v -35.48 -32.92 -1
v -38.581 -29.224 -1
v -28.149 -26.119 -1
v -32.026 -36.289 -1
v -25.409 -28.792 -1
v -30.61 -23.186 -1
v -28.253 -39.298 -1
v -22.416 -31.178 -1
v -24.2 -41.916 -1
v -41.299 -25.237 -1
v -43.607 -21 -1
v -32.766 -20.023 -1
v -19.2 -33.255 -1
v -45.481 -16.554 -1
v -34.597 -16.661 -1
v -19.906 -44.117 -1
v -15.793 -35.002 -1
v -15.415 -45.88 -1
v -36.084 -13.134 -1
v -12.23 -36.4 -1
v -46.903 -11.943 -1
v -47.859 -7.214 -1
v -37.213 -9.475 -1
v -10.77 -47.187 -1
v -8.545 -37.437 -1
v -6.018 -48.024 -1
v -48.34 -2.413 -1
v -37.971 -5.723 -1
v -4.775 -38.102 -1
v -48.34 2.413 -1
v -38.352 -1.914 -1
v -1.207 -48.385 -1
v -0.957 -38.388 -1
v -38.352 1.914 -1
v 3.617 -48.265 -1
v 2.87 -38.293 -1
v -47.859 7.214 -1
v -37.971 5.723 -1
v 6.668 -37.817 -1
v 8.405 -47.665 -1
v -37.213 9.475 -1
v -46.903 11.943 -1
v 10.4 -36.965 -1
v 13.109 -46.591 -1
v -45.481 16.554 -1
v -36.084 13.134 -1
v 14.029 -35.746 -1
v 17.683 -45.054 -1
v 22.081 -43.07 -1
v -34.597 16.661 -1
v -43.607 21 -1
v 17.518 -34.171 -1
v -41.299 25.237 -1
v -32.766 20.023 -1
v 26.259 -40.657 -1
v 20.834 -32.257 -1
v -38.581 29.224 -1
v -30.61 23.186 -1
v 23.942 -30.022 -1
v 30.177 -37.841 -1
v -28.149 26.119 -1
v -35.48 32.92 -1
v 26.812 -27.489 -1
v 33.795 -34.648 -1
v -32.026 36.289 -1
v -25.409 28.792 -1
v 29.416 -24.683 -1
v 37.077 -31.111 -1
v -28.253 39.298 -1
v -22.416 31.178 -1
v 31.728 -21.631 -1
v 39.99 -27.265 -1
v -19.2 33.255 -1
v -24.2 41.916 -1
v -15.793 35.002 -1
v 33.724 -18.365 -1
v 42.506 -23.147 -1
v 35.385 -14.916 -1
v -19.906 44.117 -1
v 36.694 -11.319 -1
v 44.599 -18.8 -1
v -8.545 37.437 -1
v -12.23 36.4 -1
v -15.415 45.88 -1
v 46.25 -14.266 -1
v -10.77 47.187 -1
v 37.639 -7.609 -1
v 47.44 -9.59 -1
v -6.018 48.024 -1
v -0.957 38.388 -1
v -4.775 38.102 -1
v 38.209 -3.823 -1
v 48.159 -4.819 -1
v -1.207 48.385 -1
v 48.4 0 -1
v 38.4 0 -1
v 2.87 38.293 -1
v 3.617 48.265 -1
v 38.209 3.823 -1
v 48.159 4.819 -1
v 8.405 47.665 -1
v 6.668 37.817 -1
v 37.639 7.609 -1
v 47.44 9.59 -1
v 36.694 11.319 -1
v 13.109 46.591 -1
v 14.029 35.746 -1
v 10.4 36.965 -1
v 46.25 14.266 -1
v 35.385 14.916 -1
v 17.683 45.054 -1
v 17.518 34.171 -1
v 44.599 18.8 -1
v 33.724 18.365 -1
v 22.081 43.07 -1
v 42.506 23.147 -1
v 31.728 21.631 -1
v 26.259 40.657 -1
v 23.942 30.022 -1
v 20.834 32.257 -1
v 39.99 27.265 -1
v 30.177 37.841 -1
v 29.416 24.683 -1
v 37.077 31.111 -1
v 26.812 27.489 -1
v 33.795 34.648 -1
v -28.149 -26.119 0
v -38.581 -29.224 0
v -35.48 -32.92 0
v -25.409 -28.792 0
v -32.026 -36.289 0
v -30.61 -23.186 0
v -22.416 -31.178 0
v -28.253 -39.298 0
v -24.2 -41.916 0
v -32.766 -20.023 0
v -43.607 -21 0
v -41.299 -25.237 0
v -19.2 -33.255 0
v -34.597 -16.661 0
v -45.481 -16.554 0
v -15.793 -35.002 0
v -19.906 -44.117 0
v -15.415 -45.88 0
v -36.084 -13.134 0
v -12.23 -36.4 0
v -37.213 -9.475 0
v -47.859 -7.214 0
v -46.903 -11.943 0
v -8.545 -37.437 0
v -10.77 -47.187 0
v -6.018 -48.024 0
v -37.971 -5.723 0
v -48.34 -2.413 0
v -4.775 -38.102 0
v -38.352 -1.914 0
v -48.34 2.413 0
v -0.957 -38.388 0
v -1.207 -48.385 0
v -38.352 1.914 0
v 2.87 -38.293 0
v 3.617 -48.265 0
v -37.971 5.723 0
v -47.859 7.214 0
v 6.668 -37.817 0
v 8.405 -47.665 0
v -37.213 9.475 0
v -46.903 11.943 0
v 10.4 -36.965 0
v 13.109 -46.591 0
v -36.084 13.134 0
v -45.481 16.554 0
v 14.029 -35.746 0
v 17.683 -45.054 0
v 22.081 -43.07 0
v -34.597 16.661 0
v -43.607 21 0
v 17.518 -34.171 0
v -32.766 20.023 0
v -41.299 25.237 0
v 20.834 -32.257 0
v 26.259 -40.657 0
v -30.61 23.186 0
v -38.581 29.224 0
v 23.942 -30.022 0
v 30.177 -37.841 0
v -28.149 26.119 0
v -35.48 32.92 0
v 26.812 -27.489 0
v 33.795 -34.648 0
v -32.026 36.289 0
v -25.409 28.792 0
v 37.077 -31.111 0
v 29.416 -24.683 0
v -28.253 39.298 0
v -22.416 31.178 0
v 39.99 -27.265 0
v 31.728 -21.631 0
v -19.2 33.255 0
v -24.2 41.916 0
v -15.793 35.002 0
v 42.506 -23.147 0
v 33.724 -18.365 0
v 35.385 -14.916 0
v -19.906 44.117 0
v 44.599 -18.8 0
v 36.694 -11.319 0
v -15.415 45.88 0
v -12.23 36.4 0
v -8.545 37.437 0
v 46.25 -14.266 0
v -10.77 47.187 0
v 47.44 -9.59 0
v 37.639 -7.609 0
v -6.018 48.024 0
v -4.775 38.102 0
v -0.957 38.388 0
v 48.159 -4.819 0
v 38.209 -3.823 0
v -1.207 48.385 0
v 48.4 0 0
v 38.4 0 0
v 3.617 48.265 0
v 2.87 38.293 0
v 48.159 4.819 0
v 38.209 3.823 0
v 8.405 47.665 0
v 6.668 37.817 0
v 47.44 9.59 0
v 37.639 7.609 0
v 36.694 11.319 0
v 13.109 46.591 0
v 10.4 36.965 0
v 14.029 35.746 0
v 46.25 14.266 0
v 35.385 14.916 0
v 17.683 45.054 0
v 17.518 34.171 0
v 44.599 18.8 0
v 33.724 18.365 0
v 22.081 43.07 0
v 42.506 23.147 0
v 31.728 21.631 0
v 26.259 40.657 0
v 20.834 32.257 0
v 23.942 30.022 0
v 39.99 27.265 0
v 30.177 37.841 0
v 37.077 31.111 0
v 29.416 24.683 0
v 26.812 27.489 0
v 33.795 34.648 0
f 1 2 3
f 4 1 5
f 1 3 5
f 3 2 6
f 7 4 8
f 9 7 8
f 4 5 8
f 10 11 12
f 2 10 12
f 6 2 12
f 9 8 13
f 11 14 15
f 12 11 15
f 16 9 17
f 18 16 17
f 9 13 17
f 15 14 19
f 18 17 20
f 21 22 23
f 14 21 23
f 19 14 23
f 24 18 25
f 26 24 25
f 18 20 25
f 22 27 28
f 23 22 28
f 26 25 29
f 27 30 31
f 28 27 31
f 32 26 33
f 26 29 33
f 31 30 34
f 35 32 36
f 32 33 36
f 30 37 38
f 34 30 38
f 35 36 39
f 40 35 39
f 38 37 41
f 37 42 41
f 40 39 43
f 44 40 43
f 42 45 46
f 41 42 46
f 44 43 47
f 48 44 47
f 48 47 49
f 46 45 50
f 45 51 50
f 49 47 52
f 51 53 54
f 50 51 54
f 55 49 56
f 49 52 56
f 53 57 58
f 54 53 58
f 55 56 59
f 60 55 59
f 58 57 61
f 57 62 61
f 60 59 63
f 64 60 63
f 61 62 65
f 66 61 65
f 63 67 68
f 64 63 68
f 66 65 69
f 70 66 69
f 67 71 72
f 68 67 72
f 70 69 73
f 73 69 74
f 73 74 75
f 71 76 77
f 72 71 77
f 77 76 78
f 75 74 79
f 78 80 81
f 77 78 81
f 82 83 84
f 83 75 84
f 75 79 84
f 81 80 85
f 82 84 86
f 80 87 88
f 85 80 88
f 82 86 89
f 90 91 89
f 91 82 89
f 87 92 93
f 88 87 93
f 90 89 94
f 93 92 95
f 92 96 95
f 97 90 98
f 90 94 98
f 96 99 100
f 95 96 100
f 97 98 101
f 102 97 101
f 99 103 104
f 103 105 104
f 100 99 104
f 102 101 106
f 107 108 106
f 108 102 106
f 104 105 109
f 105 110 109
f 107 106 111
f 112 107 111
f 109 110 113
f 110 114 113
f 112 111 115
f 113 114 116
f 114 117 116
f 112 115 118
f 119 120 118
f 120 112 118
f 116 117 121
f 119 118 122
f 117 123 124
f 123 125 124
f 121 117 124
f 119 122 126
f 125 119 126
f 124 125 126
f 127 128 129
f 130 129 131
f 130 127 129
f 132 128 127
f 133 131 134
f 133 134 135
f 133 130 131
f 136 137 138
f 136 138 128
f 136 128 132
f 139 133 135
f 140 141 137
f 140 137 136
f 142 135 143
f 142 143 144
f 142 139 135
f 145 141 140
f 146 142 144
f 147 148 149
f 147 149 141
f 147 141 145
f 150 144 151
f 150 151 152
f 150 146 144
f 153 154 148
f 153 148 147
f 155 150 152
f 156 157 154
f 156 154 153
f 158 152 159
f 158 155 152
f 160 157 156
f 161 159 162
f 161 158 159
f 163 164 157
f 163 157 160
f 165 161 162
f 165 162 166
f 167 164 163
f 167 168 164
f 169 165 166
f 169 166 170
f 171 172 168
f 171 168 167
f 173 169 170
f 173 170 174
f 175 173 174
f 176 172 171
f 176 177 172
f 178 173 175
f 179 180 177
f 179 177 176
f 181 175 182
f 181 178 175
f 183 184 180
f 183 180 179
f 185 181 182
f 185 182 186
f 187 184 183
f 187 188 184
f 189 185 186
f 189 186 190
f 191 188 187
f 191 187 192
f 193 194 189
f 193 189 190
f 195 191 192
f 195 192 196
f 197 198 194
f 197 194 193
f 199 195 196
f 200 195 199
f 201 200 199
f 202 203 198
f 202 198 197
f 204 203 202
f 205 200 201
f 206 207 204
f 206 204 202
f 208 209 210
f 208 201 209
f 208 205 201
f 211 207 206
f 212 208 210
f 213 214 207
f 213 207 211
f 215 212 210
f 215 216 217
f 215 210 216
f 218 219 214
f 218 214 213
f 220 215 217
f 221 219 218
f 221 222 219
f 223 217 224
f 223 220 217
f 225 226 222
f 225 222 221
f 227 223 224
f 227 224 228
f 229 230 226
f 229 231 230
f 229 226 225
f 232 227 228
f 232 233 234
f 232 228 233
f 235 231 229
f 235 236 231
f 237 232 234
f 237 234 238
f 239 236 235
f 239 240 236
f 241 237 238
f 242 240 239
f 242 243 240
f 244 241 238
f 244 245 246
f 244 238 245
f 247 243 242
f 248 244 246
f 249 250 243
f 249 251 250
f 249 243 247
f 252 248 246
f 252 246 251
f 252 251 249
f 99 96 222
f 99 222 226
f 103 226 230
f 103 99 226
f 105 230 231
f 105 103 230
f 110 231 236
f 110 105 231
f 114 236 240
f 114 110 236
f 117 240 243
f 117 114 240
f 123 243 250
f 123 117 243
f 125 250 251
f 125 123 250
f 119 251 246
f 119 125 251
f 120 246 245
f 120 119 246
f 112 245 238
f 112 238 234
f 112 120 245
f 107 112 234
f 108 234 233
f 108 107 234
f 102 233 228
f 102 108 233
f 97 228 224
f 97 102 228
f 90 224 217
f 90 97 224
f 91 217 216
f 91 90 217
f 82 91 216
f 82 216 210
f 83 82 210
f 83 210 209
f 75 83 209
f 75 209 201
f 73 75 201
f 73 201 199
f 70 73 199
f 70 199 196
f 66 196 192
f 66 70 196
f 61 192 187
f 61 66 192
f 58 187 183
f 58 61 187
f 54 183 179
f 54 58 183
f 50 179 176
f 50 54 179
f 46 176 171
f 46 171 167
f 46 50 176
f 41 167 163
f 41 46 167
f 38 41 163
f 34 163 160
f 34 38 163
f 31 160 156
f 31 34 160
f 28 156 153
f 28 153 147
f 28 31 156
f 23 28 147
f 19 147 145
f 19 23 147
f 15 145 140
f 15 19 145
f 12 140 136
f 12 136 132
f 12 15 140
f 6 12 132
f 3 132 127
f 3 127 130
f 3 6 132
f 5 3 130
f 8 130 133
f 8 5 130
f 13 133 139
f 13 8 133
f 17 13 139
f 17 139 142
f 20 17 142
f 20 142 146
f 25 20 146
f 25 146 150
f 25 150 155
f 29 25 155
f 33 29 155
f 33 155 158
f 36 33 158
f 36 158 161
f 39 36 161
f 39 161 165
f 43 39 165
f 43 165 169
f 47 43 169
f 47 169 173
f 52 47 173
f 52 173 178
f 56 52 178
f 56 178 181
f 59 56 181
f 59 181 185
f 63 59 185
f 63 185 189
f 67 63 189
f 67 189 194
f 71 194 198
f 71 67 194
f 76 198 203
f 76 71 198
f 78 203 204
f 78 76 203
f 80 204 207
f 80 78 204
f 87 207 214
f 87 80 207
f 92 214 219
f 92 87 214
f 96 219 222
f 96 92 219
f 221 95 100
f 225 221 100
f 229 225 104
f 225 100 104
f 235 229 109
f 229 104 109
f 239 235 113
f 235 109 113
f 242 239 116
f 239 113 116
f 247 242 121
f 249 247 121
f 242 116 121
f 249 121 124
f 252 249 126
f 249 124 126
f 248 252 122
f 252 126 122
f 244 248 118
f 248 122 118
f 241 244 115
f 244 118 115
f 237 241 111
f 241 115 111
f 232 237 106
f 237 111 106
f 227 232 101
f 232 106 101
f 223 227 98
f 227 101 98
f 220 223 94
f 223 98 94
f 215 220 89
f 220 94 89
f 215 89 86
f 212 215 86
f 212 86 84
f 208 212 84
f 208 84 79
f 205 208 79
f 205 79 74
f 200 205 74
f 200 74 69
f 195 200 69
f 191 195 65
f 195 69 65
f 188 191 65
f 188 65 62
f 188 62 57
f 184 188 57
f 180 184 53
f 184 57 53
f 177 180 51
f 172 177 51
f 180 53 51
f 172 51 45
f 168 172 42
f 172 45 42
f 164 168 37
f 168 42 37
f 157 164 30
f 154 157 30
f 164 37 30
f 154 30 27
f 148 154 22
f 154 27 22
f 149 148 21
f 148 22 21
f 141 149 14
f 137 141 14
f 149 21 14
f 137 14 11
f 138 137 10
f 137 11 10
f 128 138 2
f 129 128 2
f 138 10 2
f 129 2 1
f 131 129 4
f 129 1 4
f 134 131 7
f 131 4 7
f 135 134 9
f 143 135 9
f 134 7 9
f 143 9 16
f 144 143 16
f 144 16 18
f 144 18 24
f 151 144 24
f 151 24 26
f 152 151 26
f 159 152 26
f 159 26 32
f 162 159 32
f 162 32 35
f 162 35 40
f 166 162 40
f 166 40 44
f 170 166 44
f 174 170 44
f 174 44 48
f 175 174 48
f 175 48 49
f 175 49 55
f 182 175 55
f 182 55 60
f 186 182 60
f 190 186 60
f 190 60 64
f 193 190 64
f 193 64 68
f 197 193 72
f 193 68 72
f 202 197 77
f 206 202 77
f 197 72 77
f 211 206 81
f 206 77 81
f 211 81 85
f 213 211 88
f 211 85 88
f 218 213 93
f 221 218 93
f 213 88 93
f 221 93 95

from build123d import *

# Parameters (mm, degrees)
CYLINDER002_R     = 38.4
CYLINDER002_DEPTH = 1
CYLINDER001_R     = 48.4
CYLINDER001_DEPTH = 1


with BuildPart() as bottom_wall_cutout:
    # Cylinder002 → Cylinder002 (new body)
    with BuildSketch(Plane.XY.offset(-1)):
        Circle(CYLINDER002_R)
    extrude(amount=CYLINDER002_DEPTH)


with BuildPart() as bottom_flange:
    # Cylinder001 → Cylinder001 (new body)
    with BuildSketch(Plane.XY.offset(-1)):
        Circle(CYLINDER001_R)
    extrude(amount=CYLINDER001_DEPTH)

    # Cut002: cut bottom_wall_cutout
    add(bottom_wall_cutout.part, mode=Mode.SUBTRACT)


solid = bottom_flange.part
